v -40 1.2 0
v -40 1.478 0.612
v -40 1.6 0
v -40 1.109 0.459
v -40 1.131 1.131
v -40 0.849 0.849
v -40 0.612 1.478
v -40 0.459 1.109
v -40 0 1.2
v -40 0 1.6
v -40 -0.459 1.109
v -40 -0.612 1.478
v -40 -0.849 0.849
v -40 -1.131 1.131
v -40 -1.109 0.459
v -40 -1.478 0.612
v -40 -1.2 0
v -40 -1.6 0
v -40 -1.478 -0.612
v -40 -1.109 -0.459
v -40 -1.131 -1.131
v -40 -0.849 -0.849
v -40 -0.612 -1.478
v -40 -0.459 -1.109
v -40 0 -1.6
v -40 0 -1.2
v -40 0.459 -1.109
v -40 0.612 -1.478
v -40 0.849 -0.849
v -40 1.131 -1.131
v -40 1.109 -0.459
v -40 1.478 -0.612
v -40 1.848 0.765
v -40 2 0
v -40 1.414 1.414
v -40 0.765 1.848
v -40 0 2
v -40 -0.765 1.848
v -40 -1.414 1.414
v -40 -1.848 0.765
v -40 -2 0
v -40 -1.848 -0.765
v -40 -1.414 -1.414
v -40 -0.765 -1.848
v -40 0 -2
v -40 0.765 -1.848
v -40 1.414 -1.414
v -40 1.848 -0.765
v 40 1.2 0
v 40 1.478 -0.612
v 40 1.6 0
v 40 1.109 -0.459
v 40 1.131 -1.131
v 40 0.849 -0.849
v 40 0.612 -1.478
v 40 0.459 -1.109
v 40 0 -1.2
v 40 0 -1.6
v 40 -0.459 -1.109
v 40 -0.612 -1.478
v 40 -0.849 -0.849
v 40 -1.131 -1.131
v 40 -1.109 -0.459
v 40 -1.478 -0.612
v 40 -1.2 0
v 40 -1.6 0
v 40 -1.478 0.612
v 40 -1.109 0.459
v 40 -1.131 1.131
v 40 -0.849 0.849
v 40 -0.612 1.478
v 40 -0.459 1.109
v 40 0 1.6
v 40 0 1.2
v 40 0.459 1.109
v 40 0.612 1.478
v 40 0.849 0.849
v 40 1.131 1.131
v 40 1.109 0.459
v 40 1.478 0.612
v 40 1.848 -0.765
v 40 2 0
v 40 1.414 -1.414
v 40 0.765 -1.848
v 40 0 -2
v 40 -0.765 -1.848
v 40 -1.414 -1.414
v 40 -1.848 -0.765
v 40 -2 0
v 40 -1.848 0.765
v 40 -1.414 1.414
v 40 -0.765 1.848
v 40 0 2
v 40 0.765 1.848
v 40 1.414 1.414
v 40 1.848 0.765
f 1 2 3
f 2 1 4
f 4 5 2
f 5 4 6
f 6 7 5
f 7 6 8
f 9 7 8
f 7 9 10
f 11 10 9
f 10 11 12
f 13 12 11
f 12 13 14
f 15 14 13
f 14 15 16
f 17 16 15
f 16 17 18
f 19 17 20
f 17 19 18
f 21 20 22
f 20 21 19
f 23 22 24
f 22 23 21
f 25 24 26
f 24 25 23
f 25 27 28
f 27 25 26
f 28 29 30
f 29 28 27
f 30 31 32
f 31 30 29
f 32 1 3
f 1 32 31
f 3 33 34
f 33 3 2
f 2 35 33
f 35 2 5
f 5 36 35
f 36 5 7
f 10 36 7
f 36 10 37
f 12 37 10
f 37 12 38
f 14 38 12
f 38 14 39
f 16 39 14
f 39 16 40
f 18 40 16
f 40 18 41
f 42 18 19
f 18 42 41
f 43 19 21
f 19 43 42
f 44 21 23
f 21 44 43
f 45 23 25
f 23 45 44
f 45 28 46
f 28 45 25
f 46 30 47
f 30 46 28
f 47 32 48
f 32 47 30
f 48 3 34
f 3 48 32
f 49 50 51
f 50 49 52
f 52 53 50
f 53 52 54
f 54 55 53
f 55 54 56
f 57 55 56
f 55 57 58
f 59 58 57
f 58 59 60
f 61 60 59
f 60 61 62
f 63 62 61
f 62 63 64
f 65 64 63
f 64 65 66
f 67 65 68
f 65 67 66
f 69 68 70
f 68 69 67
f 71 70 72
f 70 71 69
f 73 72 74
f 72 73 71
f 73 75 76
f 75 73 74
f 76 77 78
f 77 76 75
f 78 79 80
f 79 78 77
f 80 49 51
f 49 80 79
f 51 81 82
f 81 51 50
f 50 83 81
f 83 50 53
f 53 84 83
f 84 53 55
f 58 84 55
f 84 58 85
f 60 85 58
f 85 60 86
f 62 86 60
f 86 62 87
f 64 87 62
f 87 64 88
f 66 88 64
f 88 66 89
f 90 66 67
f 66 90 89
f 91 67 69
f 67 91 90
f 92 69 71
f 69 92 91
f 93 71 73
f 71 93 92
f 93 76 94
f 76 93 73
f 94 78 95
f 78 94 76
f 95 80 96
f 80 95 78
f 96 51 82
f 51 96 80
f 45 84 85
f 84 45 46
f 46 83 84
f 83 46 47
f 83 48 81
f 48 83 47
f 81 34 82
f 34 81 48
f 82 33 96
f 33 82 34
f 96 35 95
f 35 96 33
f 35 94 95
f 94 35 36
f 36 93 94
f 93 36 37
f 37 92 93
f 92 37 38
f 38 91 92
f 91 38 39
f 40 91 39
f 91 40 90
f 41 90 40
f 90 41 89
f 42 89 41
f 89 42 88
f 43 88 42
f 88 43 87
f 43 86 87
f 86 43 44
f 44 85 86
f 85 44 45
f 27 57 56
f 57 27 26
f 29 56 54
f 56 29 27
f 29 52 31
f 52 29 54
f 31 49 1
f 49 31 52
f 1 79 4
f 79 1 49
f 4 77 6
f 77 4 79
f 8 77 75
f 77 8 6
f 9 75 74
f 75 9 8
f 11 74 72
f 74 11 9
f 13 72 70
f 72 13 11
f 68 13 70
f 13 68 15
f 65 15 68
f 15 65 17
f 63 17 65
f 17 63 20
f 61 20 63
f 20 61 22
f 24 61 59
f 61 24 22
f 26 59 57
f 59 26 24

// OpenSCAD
// file: ../p/4-4disc.scad
use <../lib.scad>
$fa=1; $fs=0.2;
function ldraw_lib__4_4disc(realsolid=false) = [
// 0 Disc 1.0
// 0 Name: 4-4disc.dat
// 0 Author: James Jessiman
// 0 !LDRAW_ORG Primitive UPDATE 2002-02
// 0 !LICENSE Licensed under CC BY 2.0 and CC BY 4.0 : see CAreadme.txt
// 
// 0 BFC CERTIFY CCW
  [0,"BFC","CERTIFY"],
  [0,"BFC","CCW"],
// 
// 0 !HISTORY 1998-12-15 [PTadmin] Official Update 1998-10
// 0 !HISTORY 2002-03-23 [sbliss] Added BFC statement
// 0 !HISTORY 2002-04-25 [PTadmin] Official Update 2002-02
// 0 !HISTORY 2007-06-24 [PTadmin] Header formatted for Contributor Agreement
// 0 !HISTORY 2008-07-01 [PTadmin] Official Update 2008-01
// 
// 
// 3 16 0 0 0 1 0 0 0.9239 0 0.3827
  [3,16,0,0,0,1,0,0,0.9239,0,0.3827],
// 3 16 0 0 0 0.9239 0 0.3827 0.7071 0 0.7071
  [3,16,0,0,0,0.9239,0,0.3827,0.7071,0,0.7071],
// 3 16 0 0 0 0.7071 0 0.7071 0.3827 0 0.9239
  [3,16,0,0,0,0.7071,0,0.7071,0.3827,0,0.9239],
// 3 16 0 0 0 0.3827 0 0.9239 0 0 1
  [3,16,0,0,0,0.3827,0,0.9239,0,0,1],
// 3 16 0 0 0 0 0 1 -0.3827 0 0.9239
  [3,16,0,0,0,0,0,1,-0.3827,0,0.9239],
// 3 16 0 0 0 -0.3827 0 0.9239 -0.7071 0 0.7071
  [3,16,0,0,0,-0.3827,0,0.9239,-0.7071,0,0.7071],
// 3 16 0 0 0 -0.7071 0 0.7071 -0.9239 0 0.3827
  [3,16,0,0,0,-0.7071,0,0.7071,-0.9239,0,0.3827],
// 3 16 0 0 0 -0.9239 0 0.3827 -1 0 -0
  [3,16,0,0,0,-0.9239,0,0.3827,-1,0,-0],
// 3 16 0 0 0 -1 0 -0 -0.9239 0 -0.3827
  [3,16,0,0,0,-1,0,-0,-0.9239,0,-0.3827],
// 3 16 0 0 0 -0.9239 0 -0.3827 -0.7071 0 -0.7071
  [3,16,0,0,0,-0.9239,0,-0.3827,-0.7071,0,-0.7071],
// 3 16 0 0 0 -0.7071 0 -0.7071 -0.3827 0 -0.9239
  [3,16,0,0,0,-0.7071,0,-0.7071,-0.3827,0,-0.9239],
// 3 16 0 0 0 -0.3827 0 -0.9239 0 0 -1
  [3,16,0,0,0,-0.3827,0,-0.9239,0,0,-1],
// 3 16 0 0 0 0 0 -1 0.3827 0 -0.9239
  [3,16,0,0,0,0,0,-1,0.3827,0,-0.9239],
// 3 16 0 0 0 0.3827 0 -0.9239 0.7071 0 -0.7071
  [3,16,0,0,0,0.3827,0,-0.9239,0.7071,0,-0.7071],
// 3 16 0 0 0 0.7071 0 -0.7071 0.9239 0 -0.3827
  [3,16,0,0,0,0.7071,0,-0.7071,0.9239,0,-0.3827],
// 3 16 0 0 0 0.9239 0 -0.3827 1 0 0
  [3,16,0,0,0,0.9239,0,-0.3827,1,0,0],
// 0
];
module ldraw_lib__4_4disc(step=0, col=false, unit=2/5, alt=false, line=0.2, solid=!$preview)
    makepoly(ldraw_lib__4_4disc(solid), step=step, col=col, unit=unit, alt=alt, line=line, solid=solid);
ldraw_lib__4_4disc(line=0.2);
// file: ../p/stud3.scad
use <../lib.scad>
use <4-4cyli.scad>
use <4-4disc.scad>
use <4-4edge.scad>
$fa=1; $fs=0.2;
function ldraw_lib__stud3(realsolid=false) = realsolid ? 
    [openscad(translate([0,0,-eps()], o=cylinder(4+eps(), r=4)),2)] : [
// 0 Stud Tube Solid
// 0 Name: stud3.dat
// 0 Author: James Jessiman
// 0 !LDRAW_ORG Primitive UPDATE 2012-01
// 0 !LICENSE Licensed under CC BY 2.0 and CC BY 4.0 : see CAreadme.txt
// 
// 0 BFC CERTIFY CCW
  [0,"BFC","CERTIFY"],
  [0,"BFC","CCW"],
// 
// 0 !HISTORY 2002-04-04 [sbliss] Modified for BFC compliance
// 0 !HISTORY 2002-04-25 [PTadmin] Official Update 2002-02
// 0 !HISTORY 2007-06-24 [PTadmin] Header formatted for Contributor Agreement
// 0 !HISTORY 2008-07-01 [PTadmin] Official Update 2008-01
// 0 !HISTORY 2012-02-16 [Philo] Changed to CCW
// 0 !HISTORY 2012-03-30 [PTadmin] Official Update 2012-01
// 
// 
// 1 16 0 -4 0 4 0 0 0 1 0 0 0 4 4-4edge.dat
  [1,16,0,-4,0,4,0,0,0,1,0,0,0,4, ldraw_lib__4_4edge(realsolid)],
// 1 16 0 0 0 4 0 0 0 1 0 0 0 4 4-4edge.dat
  [1,16,0,0,0,4,0,0,0,1,0,0,0,4, ldraw_lib__4_4edge(realsolid)],
// 1 16 0 -4 0 4 0 0 0 1 0 0 0 4 4-4disc.dat
  [1,16,0,-4,0,4,0,0,0,1,0,0,0,4, ldraw_lib__4_4disc(realsolid)],
// 1 16 0 -4 0 4 0 0 0 4 0 0 0 4 4-4cyli.dat
  [1,16,0,-4,0,4,0,0,0,4,0,0,0,4, ldraw_lib__4_4cyli(realsolid)],
];
module ldraw_lib__stud3(step=0, col=false, unit=2/5, alt=false, line=0.2, solid=!$preview)
    makepoly(ldraw_lib__stud3(solid), step=step, col=col, unit=unit, alt=alt, line=line, solid=solid);
ldraw_lib__stud3(line=0.2);
// file: ../p/stud.scad
use <../lib.scad>
use <4-4cyli.scad>
use <4-4disc.scad>
use <4-4edge.scad>
$fa=1; $fs=0.2;
function ldraw_lib__stud(realsolid=false) = realsolid ? 
    [openscad(translate([0,0,-eps()], o=cylinder(4+eps(), r=6)),2)] : [
// 0 Stud
// 0 Name: stud.dat
// 0 Author: James Jessiman
// 0 !LDRAW_ORG Primitive UPDATE 2012-01
// 0 !LICENSE Licensed under CC BY 2.0 and CC BY 4.0 : see CAreadme.txt
// 
// 0 BFC CERTIFY CCW
  [0,"BFC","CERTIFY"],
  [0,"BFC","CCW"],
// 
// 0 !HISTORY 2002-04-04 [sbliss] Modified for BFC compliance
// 0 !HISTORY 2002-04-25 [PTadmin] Official Update 2002-02
// 0 !HISTORY 2007-06-24 [PTadmin] Header formatted for Contributor Agreement
// 0 !HISTORY 2008-07-01 [PTadmin] Official Update 2008-01
// 0 !HISTORY 2012-02-16 [Philo] Changed to CCW
// 0 !HISTORY 2012-03-30 [PTadmin] Official Update 2012-01
// 
// 
// 1 16 0 0 0 6 0 0 0 1 0 0 0 6 4-4edge.dat
  [1,16,0,0,0,6,0,0,0,1,0,0,0,6, ldraw_lib__4_4edge(realsolid)],
// 1 16 0 -4 0 6 0 0 0 1 0 0 0 6 4-4edge.dat
  [1,16,0,-4,0,6,0,0,0,1,0,0,0,6, ldraw_lib__4_4edge(realsolid)],
// 1 16 0 0 0 6 0 0 0 -4 0 0 0 6 4-4cyli.dat
  [1,16,0,0,0,6,0,0,0,-4,0,0,0,6, ldraw_lib__4_4cyli(realsolid)],
// 1 16 0 -4 0 6 0 0 0 1 0 0 0 6 4-4disc.dat
  [1,16,0,-4,0,6,0,0,0,1,0,0,0,6, ldraw_lib__4_4disc(realsolid)],
];
module ldraw_lib__stud(step=0, col=false, unit=2/5, alt=false, line=0.2, solid=!$preview)
    makepoly(ldraw_lib__stud(solid), step=step, col=col, unit=unit, alt=alt, line=line, solid=solid);
ldraw_lib__stud(line=0.2);
// file: ../p/box5.scad
use <../lib.scad>
$fa=1; $fs=0.2;
function ldraw_lib__box5(realsolid=false) = [
// 0 Box with 5 Faces and All Edges
// 0 Name: box5.dat
// 0 Author: James Jessiman
// 0 !LDRAW_ORG Primitive UPDATE 2012-01
// 0 !LICENSE Licensed under CC BY 2.0 and CC BY 4.0 : see CAreadme.txt
// 
// 0 BFC CERTIFY CCW
  [0,"BFC","CERTIFY"],
  [0,"BFC","CCW"],
// 
// 0 !HISTORY 2002-04-03 [sbliss] Modified for BFC compliance
// 0 !HISTORY 2002-04-25 [PTadmin] Official Update 2002-02
// 0 !HISTORY 2007-06-24 [PTadmin] Header formatted for Contributor Agreement
// 0 !HISTORY 2008-07-01 [PTadmin] Official Update 2008-01
// 0 !HISTORY 2012-02-16 [Philo] Changed to CCW
// 0 !HISTORY 2012-03-30 [PTadmin] Official Update 2012-01
// 
// 
// 2 24 1 1 1 -1 1 1
  [2,24,1,1,1,-1,1,1],
// 2 24 -1 1 1 -1 1 -1
  [2,24,-1,1,1,-1,1,-1],
// 2 24 -1 1 -1 1 1 -1
  [2,24,-1,1,-1,1,1,-1],
// 2 24 1 1 -1 1 1 1
  [2,24,1,1,-1,1,1,1],
// 2 24 1 0 1 -1 0 1
  [2,24,1,0,1,-1,0,1],
// 2 24 -1 0 1 -1 0 -1
  [2,24,-1,0,1,-1,0,-1],
// 2 24 -1 0 -1 1 0 -1
  [2,24,-1,0,-1,1,0,-1],
// 2 24 1 0 -1 1 0 1
  [2,24,1,0,-1,1,0,1],
// 2 24 1 0 1 1 1 1
  [2,24,1,0,1,1,1,1],
// 2 24 -1 0 1 -1 1 1
  [2,24,-1,0,1,-1,1,1],
// 2 24 1 0 -1 1 1 -1
  [2,24,1,0,-1,1,1,-1],
// 2 24 -1 0 -1 -1 1 -1
  [2,24,-1,0,-1,-1,1,-1],
// 4 16 -1 1 1 1 1 1 1 1 -1 -1 1 -1
  [4,16,-1,1,1,1,1,1,1,1,-1,-1,1,-1],
// 4 16 -1 1 1 -1 0 1 1 0 1 1 1 1
  [4,16,-1,1,1,-1,0,1,1,0,1,1,1,1],
// 4 16 -1 1 -1 -1 0 -1 -1 0 1 -1 1 1
  [4,16,-1,1,-1,-1,0,-1,-1,0,1,-1,1,1],
// 4 16 1 1 -1 1 0 -1 -1 0 -1 -1 1 -1
  [4,16,1,1,-1,1,0,-1,-1,0,-1,-1,1,-1],
// 4 16 1 1 1 1 0 1 1 0 -1 1 1 -1
  [4,16,1,1,1,1,0,1,1,0,-1,1,1,-1],
];
module ldraw_lib__box5(step=0, col=false, unit=2/5, alt=false, line=0.2, solid=!$preview)
    makepoly(ldraw_lib__box5(solid), step=step, col=col, unit=unit, alt=alt, line=line, solid=solid);
ldraw_lib__box5(line=0.2);
// file: ../p/box4t.scad
use <../lib.scad>
$fa=1; $fs=0.2;
function ldraw_lib__box4t(realsolid=false) = [
// 0 Box with 4 Adjacent Faces and All Edges
// 0 Name: box4t.dat
// 0 Author: Tore Eriksson [Tore_Eriksson]
// 0 !LDRAW_ORG Primitive UPDATE 2003-02
// 0 !LICENSE Licensed under CC BY 2.0 and CC BY 4.0 : see CAreadme.txt
// 
// 0 BFC CERTIFY CCW
  [0,"BFC","CERTIFY"],
  [0,"BFC","CCW"],
// 
// 0 !HISTORY 1997-09-29 [PTadmin] Official Update 1997-15
// 0 !HISTORY 2002-08-31 [izanette] Modified with WINDZ for BFC compliance
// 0 !HISTORY 2003-08-01 [PTadmin] Official Update 2003-02
// 0 !HISTORY 2007-06-24 [PTadmin] Header formatted for Contributor Agreement
// 0 !HISTORY 2008-07-01 [PTadmin] Official Update 2008-01
// 
// 
// 2 24 1 1 1 -1 1 1
  [2,24,1,1,1,-1,1,1],
// 2 24 -1 1 1 -1 1 -1
  [2,24,-1,1,1,-1,1,-1],
// 2 24 -1 1 -1 1 1 -1
  [2,24,-1,1,-1,1,1,-1],
// 2 24 1 1 -1 1 1 1
  [2,24,1,1,-1,1,1,1],
// 2 24 1 0 1 -1 0 1
  [2,24,1,0,1,-1,0,1],
// 2 24 -1 0 1 -1 0 -1
  [2,24,-1,0,1,-1,0,-1],
// 2 24 -1 0 -1 1 0 -1
  [2,24,-1,0,-1,1,0,-1],
// 2 24 1 0 -1 1 0 1
  [2,24,1,0,-1,1,0,1],
// 2 24 1 0 1 1 1 1
  [2,24,1,0,1,1,1,1],
// 2 24 -1 0 1 -1 1 1
  [2,24,-1,0,1,-1,1,1],
// 2 24 1 0 -1 1 1 -1
  [2,24,1,0,-1,1,1,-1],
// 2 24 -1 0 -1 -1 1 -1
  [2,24,-1,0,-1,-1,1,-1],
// 4 16 1 1 1 1 1 -1 -1 1 -1 -1 1 1
  [4,16,1,1,1,1,1,-1,-1,1,-1,-1,1,1],
// 4 16 1 1 1 -1 1 1 -1 0 1 1 0 1
  [4,16,1,1,1,-1,1,1,-1,0,1,1,0,1],
// 4 16 -1 1 1 -1 1 -1 -1 0 -1 -1 0 1
  [4,16,-1,1,1,-1,1,-1,-1,0,-1,-1,0,1],
// 0 4 16 -1 1 -1 -1 0 -1 1 0 -1 1 1 -1
// 4 16 1 1 -1 1 1 1 1 0 1 1 0 -1
  [4,16,1,1,-1,1,1,1,1,0,1,1,0,-1],
// 0
];
module ldraw_lib__box4t(step=0, col=false, unit=2/5, alt=false, line=0.2, solid=!$preview)
    makepoly(ldraw_lib__box4t(solid), step=step, col=col, unit=unit, alt=alt, line=line, solid=solid);
ldraw_lib__box4t(line=0.2);
// file: s/3004s01.scad
use <../../lib.scad>
use <../../p/box4t.scad>
use <../../p/box5.scad>
use <../../p/stud.scad>
use <../../p/stud3.scad>
$fa=1; $fs=0.2;
function ldraw_lib__s__3004s01(realsolid=false) = [
// 0 ~Brick  1 x  2 without Front Face
// 0 Name: s\3004s01.dat
// 0 Author: James Jessiman
// 0 !LDRAW_ORG Subpart UPDATE 2003-03
// 0 !LICENSE Licensed under CC BY 2.0 and CC BY 4.0 : see CAreadme.txt
// 
// 0 BFC CERTIFY CCW
  [0,"BFC","CERTIFY"],
  [0,"BFC","CCW"],
// 
// 0 !HISTORY 2003-09-07 [jriley] Subfiling, BFC
// 0 !HISTORY 2003-12-19 [PTadmin] Official Update 2003-03
// 0 !HISTORY 2007-08-29 [PTadmin] Header formatted for Contributor Agreement
// 0 !HISTORY 2008-07-01 [PTadmin] Official Update 2008-01
// 
// 
// 1 16 0 4 0 1 0 0 0 -5 0 0 0 1 stud3.dat
  [1,16,0,4,0,1,0,0,0,-5,0,0,0,1, ldraw_lib__stud3(realsolid)],
// 0 BFC INVERTNEXT
  [0,"BFC","INVERTNEXT"],
// 1 16 0 24 0 16 0 0 0 -20 0 0 0 6 box5.dat
  [1,16,0,24,0,16,0,0,0,-20,0,0,0,6, ldraw_lib__box5(realsolid)],
// 4 16 20 24 10 16 24 6 -16 24 6 -20 24 10
  [4,16,20,24,10,16,24,6,-16,24,6,-20,24,10],
// 4 16 -20 24 10 -16 24 6 -16 24 -6 -20 24 -10
  [4,16,-20,24,10,-16,24,6,-16,24,-6,-20,24,-10],
// 4 16 -20 24 -10 -16 24 -6 16 24 -6 20 24 -10
  [4,16,-20,24,-10,-16,24,-6,16,24,-6,20,24,-10],
// 4 16 20 24 -10 16 24 -6 16 24 6 20 24 10
  [4,16,20,24,-10,16,24,-6,16,24,6,20,24,10],
// 1 16 0 24 0 20 0 0 0 -24 0 0 0 10 box4t.dat
  [1,16,0,24,0,20,0,0,0,-24,0,0,0,10, ldraw_lib__box4t(realsolid)],
// 1 16 10 0 0 1 0 0 0 1 0 0 0 1 stud.dat
  [1,16,10,0,0,1,0,0,0,1,0,0,0,1, ldraw_lib__stud(realsolid)],
// 1 16 -10 0 0 1 0 0 0 1 0 0 0 1 stud.dat
  [1,16,-10,0,0,1,0,0,0,1,0,0,0,1, ldraw_lib__stud(realsolid)],
// 0
];
module ldraw_lib__s__3004s01(step=0, col=false, unit=2/5, alt=false, line=0.2, solid=!$preview)
    makepoly(ldraw_lib__s__3004s01(solid), step=step, col=col, unit=unit, alt=alt, line=line, solid=solid);
ldraw_lib__s__3004s01(line=0.2);
// file: ../p/4-4cyli.scad
use <../lib.scad>
$fa=1; $fs=0.2;
function ldraw_lib__4_4cyli(realsolid=false) = [
// 0 Cylinder 1.0
// 0 Name: 4-4cyli.dat
// 0 Author: James Jessiman
// 0 !LDRAW_ORG Primitive UPDATE 2005-01
// 0 !LICENSE Licensed under CC BY 2.0 and CC BY 4.0 : see CAreadme.txt
// 
// 0 BFC CERTIFY CCW
  [0,"BFC","CERTIFY"],
  [0,"BFC","CCW"],
// 
// 0 !HISTORY 1998-12-15 [PTadmin] Official Update 1998-10
// 0 !HISTORY 2002-03-23 [sbliss] Added BFC statement; merged headers from files in distributions LDraw 0.27 and Complete.
// 0 !HISTORY 2002-04-25 [PTadmin] Official Update 2002-02
// 0 !HISTORY 2004-12-14 [guyvivan] BFC CCW
// 0 !HISTORY 2005-12-28 [PTadmin] Official Update 2005-01
// 0 !HISTORY 2007-06-24 [PTadmin] Header formatted for Contributor Agreement
// 0 !HISTORY 2008-07-01 [PTadmin] Official Update 2008-01
// 
// 
// 4 16 1 1 0 0.9239 1 0.3827 0.9239 0 0.3827 1 0 0
  [4,16,1,1,0,0.9239,1,0.3827,0.9239,0,0.3827,1,0,0],
// 5 24 1 0 0 1 1 0 0.9239 0 0.3827 0.9239 0 -0.3827
  [5,24,1,0,0,1,1,0,0.9239,0,0.3827,0.9239,0,-0.3827],
// 4 16 0.9239 1 0.3827 0.7071 1 0.7071 0.7071 0 0.7071 0.9239 0 0.3827
  [4,16,0.9239,1,0.3827,0.7071,1,0.7071,0.7071,0,0.7071,0.9239,0,0.3827],
// 5 24 0.9239 0 0.3827 0.9239 1 0.3827 0.7071 0 0.7071 1 0 0
  [5,24,0.9239,0,0.3827,0.9239,1,0.3827,0.7071,0,0.7071,1,0,0],
// 4 16 0.7071 1 0.7071 0.3827 1 0.9239 0.3827 0 0.9239 0.7071 0 0.7071
  [4,16,0.7071,1,0.7071,0.3827,1,0.9239,0.3827,0,0.9239,0.7071,0,0.7071],
// 5 24 0.7071 0 0.7071 0.7071 1 0.7071 0.3827 0 0.9239 0.9239 0 0.3827
  [5,24,0.7071,0,0.7071,0.7071,1,0.7071,0.3827,0,0.9239,0.9239,0,0.3827],
// 4 16 0.3827 1 0.9239 0 1 1 0 0 1 0.3827 0 0.9239
  [4,16,0.3827,1,0.9239,0,1,1,0,0,1,0.3827,0,0.9239],
// 5 24 0.3827 0 0.9239 0.3827 1 0.9239 0 0 1 0.7071 0 0.7071
  [5,24,0.3827,0,0.9239,0.3827,1,0.9239,0,0,1,0.7071,0,0.7071],
// 4 16 0 1 1 -0.3827 1 0.9239 -0.3827 0 0.9239 0 0 1
  [4,16,0,1,1,-0.3827,1,0.9239,-0.3827,0,0.9239,0,0,1],
// 5 24 0 0 1 0 1 1 -0.3827 0 0.9239 0.3827 0 0.9239
  [5,24,0,0,1,0,1,1,-0.3827,0,0.9239,0.3827,0,0.9239],
// 4 16 -0.3827 1 0.9239 -0.7071 1 0.7071 -0.7071 0 0.7071 -0.3827 0 0.9239
  [4,16,-0.3827,1,0.9239,-0.7071,1,0.7071,-0.7071,0,0.7071,-0.3827,0,0.9239],
// 5 24 -0.3827 0 0.9239 -0.3827 1 0.9239 -0.7071 0 0.7071 0 0 1
  [5,24,-0.3827,0,0.9239,-0.3827,1,0.9239,-0.7071,0,0.7071,0,0,1],
// 4 16 -0.7071 1 0.7071 -0.9239 1 0.3827 -0.9239 0 0.3827 -0.7071 0 0.7071
  [4,16,-0.7071,1,0.7071,-0.9239,1,0.3827,-0.9239,0,0.3827,-0.7071,0,0.7071],
// 5 24 -0.7071 0 0.7071 -0.7071 1 0.7071 -0.9239 0 0.3827 -0.3827 0 0.9239
  [5,24,-0.7071,0,0.7071,-0.7071,1,0.7071,-0.9239,0,0.3827,-0.3827,0,0.9239],
// 4 16 -0.9239 1 0.3827 -1 1 0 -1 0 0 -0.9239 0 0.3827
  [4,16,-0.9239,1,0.3827,-1,1,0,-1,0,0,-0.9239,0,0.3827],
// 5 24 -0.9239 0 0.3827 -0.9239 1 0.3827 -1 0 0 -0.7071 0 0.7071
  [5,24,-0.9239,0,0.3827,-0.9239,1,0.3827,-1,0,0,-0.7071,0,0.7071],
// 4 16 -1 1 0 -0.9239 1 -0.3827 -0.9239 0 -0.3827 -1 0 0
  [4,16,-1,1,0,-0.9239,1,-0.3827,-0.9239,0,-0.3827,-1,0,0],
// 5 24 -1 0 0 -1 1 0 -0.9239 0 -0.3827 -0.9239 0 0.3827
  [5,24,-1,0,0,-1,1,0,-0.9239,0,-0.3827,-0.9239,0,0.3827],
// 4 16 -0.9239 1 -0.3827 -0.7071 1 -0.7071 -0.7071 0 -0.7071 -0.9239 0 -0.3827
  [4,16,-0.9239,1,-0.3827,-0.7071,1,-0.7071,-0.7071,0,-0.7071,-0.9239,0,-0.3827],
// 5 24 -0.9239 0 -0.3827 -0.9239 1 -0.3827 -0.7071 0 -0.7071 -1 0 0
  [5,24,-0.9239,0,-0.3827,-0.9239,1,-0.3827,-0.7071,0,-0.7071,-1,0,0],
// 4 16 -0.7071 1 -0.7071 -0.3827 1 -0.9239 -0.3827 0 -0.9239 -0.7071 0 -0.7071
  [4,16,-0.7071,1,-0.7071,-0.3827,1,-0.9239,-0.3827,0,-0.9239,-0.7071,0,-0.7071],
// 5 24 -0.7071 0 -0.7071 -0.7071 1 -0.7071 -0.3827 0 -0.9239 -0.9239 0 -0.3827
  [5,24,-0.7071,0,-0.7071,-0.7071,1,-0.7071,-0.3827,0,-0.9239,-0.9239,0,-0.3827],
// 4 16 -0.3827 1 -0.9239 0 1 -1 0 0 -1 -0.3827 0 -0.9239
  [4,16,-0.3827,1,-0.9239,0,1,-1,0,0,-1,-0.3827,0,-0.9239],
// 5 24 -0.3827 0 -0.9239 -0.3827 1 -0.9239 0 0 -1 -0.7071 0 -0.7071
  [5,24,-0.3827,0,-0.9239,-0.3827,1,-0.9239,0,0,-1,-0.7071,0,-0.7071],
// 4 16 0 1 -1 0.3827 1 -0.9239 0.3827 0 -0.9239 0 0 -1
  [4,16,0,1,-1,0.3827,1,-0.9239,0.3827,0,-0.9239,0,0,-1],
// 5 24 0 0 -1 0 1 -1 0.3827 0 -0.9239 -0.3827 0 -0.9239
  [5,24,0,0,-1,0,1,-1,0.3827,0,-0.9239,-0.3827,0,-0.9239],
// 4 16 0.3827 1 -0.9239 0.7071 1 -0.7071 0.7071 0 -0.7071 0.3827 0 -0.9239
  [4,16,0.3827,1,-0.9239,0.7071,1,-0.7071,0.7071,0,-0.7071,0.3827,0,-0.9239],
// 5 24 0.3827 0 -0.9239 0.3827 1 -0.9239 0.7071 0 -0.7071 0 0 -1
  [5,24,0.3827,0,-0.9239,0.3827,1,-0.9239,0.7071,0,-0.7071,0,0,-1],
// 4 16 0.7071 1 -0.7071 0.9239 1 -0.3827 0.9239 0 -0.3827 0.7071 0 -0.7071
  [4,16,0.7071,1,-0.7071,0.9239,1,-0.3827,0.9239,0,-0.3827,0.7071,0,-0.7071],
// 5 24 0.7071 0 -0.7071 0.7071 1 -0.7071 0.9239 0 -0.3827 0.3827 0 -0.9239
  [5,24,0.7071,0,-0.7071,0.7071,1,-0.7071,0.9239,0,-0.3827,0.3827,0,-0.9239],
// 4 16 0.9239 1 -0.3827 1 1 0 1 0 0 0.9239 0 -0.3827
  [4,16,0.9239,1,-0.3827,1,1,0,1,0,0,0.9239,0,-0.3827],
// 5 24 0.9239 0 -0.3827 0.9239 1 -0.3827 1 0 0 0.7071 0 -0.7071
  [5,24,0.9239,0,-0.3827,0.9239,1,-0.3827,1,0,0,0.7071,0,-0.7071],
// 0
];
module ldraw_lib__4_4cyli(step=0, col=false, unit=2/5, alt=false, line=0.2, solid=!$preview)
    makepoly(ldraw_lib__4_4cyli(solid), step=step, col=col, unit=unit, alt=alt, line=line, solid=solid);
ldraw_lib__4_4cyli(line=0.2);
// file: ../p/4-4ring4.scad
use <../lib.scad>
$fa=1; $fs=0.2;
function ldraw_lib__4_4ring4(realsolid=false) = [
// 0 Ring  4 x 1.0
// 0 Name: 4-4ring4.dat
// 0 Author: James Jessiman
// 0 !LDRAW_ORG Primitive UPDATE 2009-01
// 0 !LICENSE Licensed under CC BY 2.0 and CC BY 4.0 : see CAreadme.txt
// 
// 0 BFC CERTIFY CCW
  [0,"BFC","CERTIFY"],
  [0,"BFC","CCW"],
// 
// 0 !HISTORY 1998-12-15 [PTadmin] Official Update 1998-10
// 0 !HISTORY 2002-04-08 [BrickCaster] Modified for BFC compliance
// 0 !HISTORY 2002-04-25 [PTadmin] Official Update 2002-02
// 0 !HISTORY 2007-06-24 [PTadmin] Header formatted for Contributor Agreement
// 0 !HISTORY 2008-07-01 [PTadmin] Official Update 2008-01
// 0 !HISTORY 2008-08-26 [cwdee] Switch polygon winding and rename
// 0 !HISTORY 2009-05-02 [PTadmin] Official Update 2009-01
// 
// 
// 4 16 -1.9135 0 4.6195 -1.5308 0 3.6956 0 0 4 0 0 5
  [4,16,-1.9135,0,4.6195,-1.5308,0,3.6956,0,0,4,0,0,5],
// 4 16 -3.5355 0 3.5355 -2.8284 0 2.8284 -1.5308 0 3.6956 -1.9135 0 4.6195
  [4,16,-3.5355,0,3.5355,-2.8284,0,2.8284,-1.5308,0,3.6956,-1.9135,0,4.6195],
// 4 16 -4.6195 0 1.9135 -3.6956 0 1.5308 -2.8284 0 2.8284 -3.5355 0 3.5355
  [4,16,-4.6195,0,1.9135,-3.6956,0,1.5308,-2.8284,0,2.8284,-3.5355,0,3.5355],
// 4 16 -5 0 0 -4 0 0 -3.6956 0 1.5308 -4.6195 0 1.9135
  [4,16,-5,0,0,-4,0,0,-3.6956,0,1.5308,-4.6195,0,1.9135],
// 4 16 -4.6195 0 -1.9135 -3.6956 0 -1.5308 -4 0 0 -5 0 0
  [4,16,-4.6195,0,-1.9135,-3.6956,0,-1.5308,-4,0,0,-5,0,0],
// 4 16 -3.5355 0 -3.5355 -2.8284 0 -2.8284 -3.6956 0 -1.5308 -4.6195 0 -1.9135
  [4,16,-3.5355,0,-3.5355,-2.8284,0,-2.8284,-3.6956,0,-1.5308,-4.6195,0,-1.9135],
// 4 16 -1.9135 0 -4.6195 -1.5308 0 -3.6956 -2.8284 0 -2.8284 -3.5355 0 -3.5355
  [4,16,-1.9135,0,-4.6195,-1.5308,0,-3.6956,-2.8284,0,-2.8284,-3.5355,0,-3.5355],
// 4 16 0 0 -5 0 0 -4 -1.5308 0 -3.6956 -1.9135 0 -4.6195
  [4,16,0,0,-5,0,0,-4,-1.5308,0,-3.6956,-1.9135,0,-4.6195],
// 4 16 1.9135 0 -4.6195 1.5308 0 -3.6956 0 0 -4 0 0 -5
  [4,16,1.9135,0,-4.6195,1.5308,0,-3.6956,0,0,-4,0,0,-5],
// 4 16 3.5355 0 -3.5355 2.8284 0 -2.8284 1.5308 0 -3.6956 1.9135 0 -4.6195
  [4,16,3.5355,0,-3.5355,2.8284,0,-2.8284,1.5308,0,-3.6956,1.9135,0,-4.6195],
// 4 16 4.6195 0 -1.9135 3.6956 0 -1.5308 2.8284 0 -2.8284 3.5355 0 -3.5355
  [4,16,4.6195,0,-1.9135,3.6956,0,-1.5308,2.8284,0,-2.8284,3.5355,0,-3.5355],
// 4 16 5 0 0 4 0 0 3.6956 0 -1.5308 4.6195 0 -1.9135
  [4,16,5,0,0,4,0,0,3.6956,0,-1.5308,4.6195,0,-1.9135],
// 4 16 4.6195 0 1.9135 3.6956 0 1.5308 4 0 0 5 0 0
  [4,16,4.6195,0,1.9135,3.6956,0,1.5308,4,0,0,5,0,0],
// 4 16 3.5355 0 3.5355 2.8284 0 2.8284 3.6956 0 1.5308 4.6195 0 1.9135
  [4,16,3.5355,0,3.5355,2.8284,0,2.8284,3.6956,0,1.5308,4.6195,0,1.9135],
// 4 16 1.9135 0 4.6195 1.5308 0 3.6956 2.8284 0 2.8284 3.5355 0 3.5355
  [4,16,1.9135,0,4.6195,1.5308,0,3.6956,2.8284,0,2.8284,3.5355,0,3.5355],
// 4 16 0 0 5 0 0 4 1.5308 0 3.6956 1.9135 0 4.6195
  [4,16,0,0,5,0,0,4,1.5308,0,3.6956,1.9135,0,4.6195],
// 0
];
module ldraw_lib__4_4ring4(step=0, col=false, unit=2/5, alt=false, line=0.2, solid=!$preview)
    makepoly(ldraw_lib__4_4ring4(solid), step=step, col=col, unit=unit, alt=alt, line=line, solid=solid);
ldraw_lib__4_4ring4(line=0.2);
// file: ../p/4-4ring3.scad
use <../lib.scad>
$fa=1; $fs=0.2;
function ldraw_lib__4_4ring3(realsolid=false) = [
// 0 Ring  3 x 1.0
// 0 Name: 4-4ring3.dat
// 0 Author: James Jessiman
// 0 !LDRAW_ORG Primitive UPDATE 2009-01
// 0 !LICENSE Licensed under CC BY 2.0 and CC BY 4.0 : see CAreadme.txt
// 
// 0 BFC CERTIFY CCW
  [0,"BFC","CERTIFY"],
  [0,"BFC","CCW"],
// 
// 0 !HISTORY 1998-12-15 [PTadmin] Official Update 1998-10
// 0 !HISTORY 2002-04-05 [hafhead] Added BFC statement
// 0 !HISTORY 2002-04-25 [PTadmin] Official Update 2002-02
// 0 !HISTORY 2007-06-24 [PTadmin] Header formatted for Contributor Agreement
// 0 !HISTORY 2008-07-01 [PTadmin] Official Update 2008-01
// 0 !HISTORY 2008-08-26 [cwdee] Switch polygon winding and rename
// 0 !HISTORY 2009-05-02 [PTadmin] Official Update 2009-01
// 
// 
// 4 16 -1.5308 0 3.6956 -1.1481 0 2.7717 0 0 3 0 0 4
  [4,16,-1.5308,0,3.6956,-1.1481,0,2.7717,0,0,3,0,0,4],
// 4 16 -2.8284 0 2.8284 -2.1213 0 2.1213 -1.1481 0 2.7717 -1.5308 0 3.6956
  [4,16,-2.8284,0,2.8284,-2.1213,0,2.1213,-1.1481,0,2.7717,-1.5308,0,3.6956],
// 4 16 -3.6956 0 1.5308 -2.7717 0 1.1481 -2.1213 0 2.1213 -2.8284 0 2.8284
  [4,16,-3.6956,0,1.5308,-2.7717,0,1.1481,-2.1213,0,2.1213,-2.8284,0,2.8284],
// 4 16 -4 0 0 -3 0 0 -2.7717 0 1.1481 -3.6956 0 1.5308
  [4,16,-4,0,0,-3,0,0,-2.7717,0,1.1481,-3.6956,0,1.5308],
// 4 16 -3.6956 0 -1.5308 -2.7717 0 -1.1481 -3 0 0 -4 0 0
  [4,16,-3.6956,0,-1.5308,-2.7717,0,-1.1481,-3,0,0,-4,0,0],
// 4 16 -2.8284 0 -2.8284 -2.1213 0 -2.1213 -2.7717 0 -1.1481 -3.6956 0 -1.5308
  [4,16,-2.8284,0,-2.8284,-2.1213,0,-2.1213,-2.7717,0,-1.1481,-3.6956,0,-1.5308],
// 4 16 -1.5308 0 -3.6956 -1.1481 0 -2.7717 -2.1213 0 -2.1213 -2.8284 0 -2.8284
  [4,16,-1.5308,0,-3.6956,-1.1481,0,-2.7717,-2.1213,0,-2.1213,-2.8284,0,-2.8284],
// 4 16 0 0 -4 0 0 -3 -1.1481 0 -2.7717 -1.5308 0 -3.6956
  [4,16,0,0,-4,0,0,-3,-1.1481,0,-2.7717,-1.5308,0,-3.6956],
// 4 16 1.5308 0 -3.6956 1.1481 0 -2.7717 0 0 -3 0 0 -4
  [4,16,1.5308,0,-3.6956,1.1481,0,-2.7717,0,0,-3,0,0,-4],
// 4 16 2.8284 0 -2.8284 2.1213 0 -2.1213 1.1481 0 -2.7717 1.5308 0 -3.6956
  [4,16,2.8284,0,-2.8284,2.1213,0,-2.1213,1.1481,0,-2.7717,1.5308,0,-3.6956],
// 4 16 3.6956 0 -1.5308 2.7717 0 -1.1481 2.1213 0 -2.1213 2.8284 0 -2.8284
  [4,16,3.6956,0,-1.5308,2.7717,0,-1.1481,2.1213,0,-2.1213,2.8284,0,-2.8284],
// 4 16 4 0 0 3 0 0 2.7717 0 -1.1481 3.6956 0 -1.5308
  [4,16,4,0,0,3,0,0,2.7717,0,-1.1481,3.6956,0,-1.5308],
// 4 16 3.6956 0 1.5308 2.7717 0 1.1481 3 0 0 4 0 0
  [4,16,3.6956,0,1.5308,2.7717,0,1.1481,3,0,0,4,0,0],
// 4 16 2.8284 0 2.8284 2.1213 0 2.1213 2.7717 0 1.1481 3.6956 0 1.5308
  [4,16,2.8284,0,2.8284,2.1213,0,2.1213,2.7717,0,1.1481,3.6956,0,1.5308],
// 4 16 1.5308 0 3.6956 1.1481 0 2.7717 2.1213 0 2.1213 2.8284 0 2.8284
  [4,16,1.5308,0,3.6956,1.1481,0,2.7717,2.1213,0,2.1213,2.8284,0,2.8284],
// 4 16 0 0 4 0 0 3 1.1481 0 2.7717 1.5308 0 3.6956
  [4,16,0,0,4,0,0,3,1.1481,0,2.7717,1.5308,0,3.6956],
// 0
];
module ldraw_lib__4_4ring3(step=0, col=false, unit=2/5, alt=false, line=0.2, solid=!$preview)
    makepoly(ldraw_lib__4_4ring3(solid), step=step, col=col, unit=unit, alt=alt, line=line, solid=solid);
ldraw_lib__4_4ring3(line=0.2);
// file: ../p/4-4edge.scad
use <../lib.scad>
$fa=1; $fs=0.2;
function ldraw_lib__4_4edge(realsolid=false) = [
// 0 Circle 1.0
// 0 Name: 4-4edge.dat
// 0 Author: James Jessiman
// 0 !LDRAW_ORG Primitive UPDATE 2017-01
// 0 !LICENSE Licensed under CC BY 2.0 and CC BY 4.0 : see CAreadme.txt
// 
// 0 BFC CERTIFY CCW
  [0,"BFC","CERTIFY"],
  [0,"BFC","CCW"],
// 
// 0 !HISTORY 1998-12-15 [PTadmin] Official Update 1998-10
// 0 !HISTORY 2005-12-28 [PTadmin] Official Update 2005-01
// 0 !HISTORY 2007-06-24 [PTadmin] Header formatted for Contributor Agreement
// 0 !HISTORY 2008-07-01 [PTadmin] Official Update 2008-01
// 0 !HISTORY 2017-01-15 [Steffen] BFCed
// 0 !HISTORY 2017-12-30 [PTadmin] Official Update 2017-01
// 
// 
// 2 24 1 0 0 0.9239 0 0.3827
  [2,24,1,0,0,0.9239,0,0.3827],
// 2 24 0.9239 0 0.3827 0.7071 0 0.7071
  [2,24,0.9239,0,0.3827,0.7071,0,0.7071],
// 2 24 0.7071 0 0.7071 0.3827 0 0.9239
  [2,24,0.7071,0,0.7071,0.3827,0,0.9239],
// 2 24 0.3827 0 0.9239 0 0 1
  [2,24,0.3827,0,0.9239,0,0,1],
// 2 24 0 0 1 -0.3827 0 0.9239
  [2,24,0,0,1,-0.3827,0,0.9239],
// 2 24 -0.3827 0 0.9239 -0.7071 0 0.7071
  [2,24,-0.3827,0,0.9239,-0.7071,0,0.7071],
// 2 24 -0.7071 0 0.7071 -0.9239 0 0.3827
  [2,24,-0.7071,0,0.7071,-0.9239,0,0.3827],
// 2 24 -0.9239 0 0.3827 -1 0 -0
  [2,24,-0.9239,0,0.3827,-1,0,-0],
// 2 24 -1 0 -0 -0.9239 0 -0.3827
  [2,24,-1,0,-0,-0.9239,0,-0.3827],
// 2 24 -0.9239 0 -0.3827 -0.7071 0 -0.7071
  [2,24,-0.9239,0,-0.3827,-0.7071,0,-0.7071],
// 2 24 -0.7071 0 -0.7071 -0.3827 0 -0.9239
  [2,24,-0.7071,0,-0.7071,-0.3827,0,-0.9239],
// 2 24 -0.3827 0 -0.9239 0 0 -1
  [2,24,-0.3827,0,-0.9239,0,0,-1],
// 2 24 0 0 -1 0.3827 0 -0.9239
  [2,24,0,0,-1,0.3827,0,-0.9239],
// 2 24 0.3827 0 -0.9239 0.7071 0 -0.7071
  [2,24,0.3827,0,-0.9239,0.7071,0,-0.7071],
// 2 24 0.7071 0 -0.7071 0.9239 0 -0.3827
  [2,24,0.7071,0,-0.7071,0.9239,0,-0.3827],
// 2 24 0.9239 0 -0.3827 1 0 0
  [2,24,0.9239,0,-0.3827,1,0,0],
];
module ldraw_lib__4_4edge(step=0, col=false, unit=2/5, alt=false, line=0.2, solid=!$preview)
    makepoly(ldraw_lib__4_4edge(solid), step=step, col=col, unit=unit, alt=alt, line=line, solid=solid);
ldraw_lib__4_4edge(line=0.2);
// file: 3004.scad
use <../lib.scad>
use <s/3004s01.scad>
$fa=1; $fs=0.2;
function ldraw_lib__3004(realsolid=false) = [
// 0 Brick  1 x  2
// 0 Name: 3004.dat
// 0 Author: James Jessiman
// 0 !LDRAW_ORG Part UPDATE 2022-05
// 0 !LICENSE Licensed under CC BY 2.0 and CC BY 4.0 : see CAreadme.txt
// 
// 0 BFC CERTIFY CCW
  [0,"BFC","CERTIFY"],
  [0,"BFC","CCW"],
// 
// 0 !HISTORY 2001-10-26 [PTadmin] Official Update 2001-01
// 0 !HISTORY 2002-05-07 {unknown} BFC Certification
// 0 !HISTORY 2002-06-11 [PTadmin] Official Update 2002-03
// 0 !HISTORY 2007-05-07 [PTadmin] Header formatted for Contributor Agreement
// 0 !HISTORY 2008-07-01 [PTadmin] Official Update 2008-01
// 0 !HISTORY 2022-08-04 [MagFors] Using subfile
// 0 !HISTORY 2022-09-15 [PTadmin] Official Update 2022-05
// 
// 
// 1 16 0 0 0 1 0 0 0 1 0 0 0 1 s\3004s01.dat
  [1,16,0,0,0,1,0,0,0,1,0,0,0,1, ldraw_lib__s__3004s01(realsolid)],
// 4 16 -20 24 -10 20 24 -10 20 0 -10 -20 0 -10
  [4,16,-20,24,-10,20,24,-10,20,0,-10,-20,0,-10],
];
module ldraw_lib__3004(step=0, col=false, unit=2/5, alt=false, line=0.2, solid=!$preview)
    makepoly(ldraw_lib__3004(solid), step=step, col=col, unit=unit, alt=alt, line=line, solid=solid);
ldraw_lib__3004(line=0.2);
// file: 71533k03.scad
use <../lib.scad>
use <../p/4-4cyli.scad>
$fa=1; $fs=0.2;
function ldraw_lib__71533k03(realsolid=false) = [
// 0 ~Technic Pneumatic Tube Segment
// 0 Name: 71533k03.dat
// 0 Author: Jaco van der Molen [Jaco]
// 0 !LDRAW_ORG Part Flexible_Section UPDATE 2020-01
// 0 !LICENSE Licensed under CC BY 2.0 and CC BY 4.0 : see CAreadme.txt
// 
// 0 BFC CERTIFY CW
  [0,"BFC","CERTIFY"],
  [0,"BFC","CW"],
// 
// 0 !HISTORY 2003-11-30 [Steffen] BFCed
// 0 !HISTORY 2009-12-29 [PTadmin] Official Update 2009-03
// 0 !HISTORY 2020-06-27 [PTadmin] Renamed from 166
// 0 !HISTORY 2020-06-28 [PTadmin] Official Update 2020-01
// 
// 
// 1 16 0 0 0 5 0 0 0 1 0 0 0 5 4-4cyli.dat
  [1,16,0,0,0,5,0,0,0,1,0,0,0,5, ldraw_lib__4_4cyli(realsolid)],
// 0 BFC INVERTNEXT
  [0,"BFC","INVERTNEXT"],
// 1 16 0 0 0 3 0 0 0 1 0 0 0 3 4-4cyli.dat
  [1,16,0,0,0,3,0,0,0,1,0,0,0,3, ldraw_lib__4_4cyli(realsolid)],
// 0
];
module ldraw_lib__71533k03(step=0, col=false, unit=2/5, alt=false, line=0.2, solid=!$preview)
    makepoly(ldraw_lib__71533k03(solid), step=step, col=col, unit=unit, alt=alt, line=line, solid=solid);
ldraw_lib__71533k03(line=0.2);
// file: 71533k02.scad
use <../lib.scad>
use <../p/4-4edge.scad>
use <../p/4-4ring3.scad>
use <../p/4-4ring4.scad>
$fa=1; $fs=0.2;
function ldraw_lib__71533k02(realsolid=false) = [
// 0 ~Technic Pneumatic Tube End (Non-Bulged)
// 0 Name: 71533k02.dat
// 0 Author: Steffen [Steffen]
// 0 !LDRAW_ORG Part Flexible_Section UPDATE 2020-01
// 0 !LICENSE Licensed under CC BY 2.0 and CC BY 4.0 : see CAreadme.txt
// 
// 0 BFC CERTIFY CCW
  [0,"BFC","CERTIFY"],
  [0,"BFC","CCW"],
// 
// 0 !HISTORY 2020-06-28 [PTadmin] Official Update 2020-01
// 
// 
// 0 // This file goes together with 71533k01.dat and 71533k03.dat.
// 0 // Those 3 files can be used to create Technic Pneumatic Tubes
// 0 // with either bulged or non-bulged ends.
// 
// 1 16 0 0 0 1 0 0 0 1 0 0 0 1 4-4ring3.dat
  [1,16,0,0,0,1,0,0,0,1,0,0,0,1, ldraw_lib__4_4ring3(realsolid)],
// 1 16 0 0 0 1 0 0 0 1 0 0 0 1 4-4ring4.dat
  [1,16,0,0,0,1,0,0,0,1,0,0,0,1, ldraw_lib__4_4ring4(realsolid)],
// 1 16 0 0 0 3 0 0 0 3 0 0 0 3 4-4edge.dat
  [1,16,0,0,0,3,0,0,0,3,0,0,0,3, ldraw_lib__4_4edge(realsolid)],
// 1 16 0 0 0 5 0 0 0 5 0 0 0 5 4-4edge.dat
  [1,16,0,0,0,5,0,0,0,5,0,0,0,5, ldraw_lib__4_4edge(realsolid)],
];
module ldraw_lib__71533k02(step=0, col=false, unit=2/5, alt=false, line=0.2, solid=!$preview)
    makepoly(ldraw_lib__71533k02(solid), step=step, col=col, unit=unit, alt=alt, line=line, solid=solid);
ldraw_lib__71533k02(line=0.2);
// main file
use <../lib.scad>
use <71533k02.scad>
use <71533k03.scad>
$fa=1; $fs=0.2;
function ldraw_lib__21767_f1(realsolid=false) = [
// 0 Technic Pneumatic Tube 10L
// 0 Name: 21767-f1.dat
// 0 Author: Philippe Hurbain [Philo]
// 0 !LDRAW_ORG Part UPDATE 2020-01
// 0 !LICENSE Licensed under CC BY 2.0 and CC BY 4.0 : see CAreadme.txt
// 
// 0 BFC CERTIFY CCW
  [0,"BFC","CERTIFY"],
  [0,"BFC","CCW"],
// 
// 0 !KEYWORDS 80 mm
// 
// 0 !HISTORY 2020-06-28 [PTadmin] Official Update 2020-01
// 
// 
// 1 16 -100 0 0 0 1 0 1 0 0 0 0 1 71533k02.dat
  [1,16,-100,0,0,0,1,0,1,0,0,0,0,1, ldraw_lib__71533k02(realsolid)],
// 1 16 100 0 0 0 -1 0 -1 0 0 0 0 1 71533k02.dat
  [1,16,100,0,0,0,-1,0,-1,0,0,0,0,1, ldraw_lib__71533k02(realsolid)],
// 1 16 -100 0 0 0 200 0 1 0 0 0 0 1 71533k03.dat
  [1,16,-100,0,0,0,200,0,1,0,0,0,0,1, ldraw_lib__71533k03(realsolid)],
];
module ldraw_lib__21767_f1(step=0, col=false, unit=2/5, alt=false, line=0.2, solid=!$preview)
    makepoly(ldraw_lib__21767_f1(solid), step=step, col=col, unit=unit, alt=alt, line=line, solid=solid);
ldraw_lib__21767_f1(line=0.2);
